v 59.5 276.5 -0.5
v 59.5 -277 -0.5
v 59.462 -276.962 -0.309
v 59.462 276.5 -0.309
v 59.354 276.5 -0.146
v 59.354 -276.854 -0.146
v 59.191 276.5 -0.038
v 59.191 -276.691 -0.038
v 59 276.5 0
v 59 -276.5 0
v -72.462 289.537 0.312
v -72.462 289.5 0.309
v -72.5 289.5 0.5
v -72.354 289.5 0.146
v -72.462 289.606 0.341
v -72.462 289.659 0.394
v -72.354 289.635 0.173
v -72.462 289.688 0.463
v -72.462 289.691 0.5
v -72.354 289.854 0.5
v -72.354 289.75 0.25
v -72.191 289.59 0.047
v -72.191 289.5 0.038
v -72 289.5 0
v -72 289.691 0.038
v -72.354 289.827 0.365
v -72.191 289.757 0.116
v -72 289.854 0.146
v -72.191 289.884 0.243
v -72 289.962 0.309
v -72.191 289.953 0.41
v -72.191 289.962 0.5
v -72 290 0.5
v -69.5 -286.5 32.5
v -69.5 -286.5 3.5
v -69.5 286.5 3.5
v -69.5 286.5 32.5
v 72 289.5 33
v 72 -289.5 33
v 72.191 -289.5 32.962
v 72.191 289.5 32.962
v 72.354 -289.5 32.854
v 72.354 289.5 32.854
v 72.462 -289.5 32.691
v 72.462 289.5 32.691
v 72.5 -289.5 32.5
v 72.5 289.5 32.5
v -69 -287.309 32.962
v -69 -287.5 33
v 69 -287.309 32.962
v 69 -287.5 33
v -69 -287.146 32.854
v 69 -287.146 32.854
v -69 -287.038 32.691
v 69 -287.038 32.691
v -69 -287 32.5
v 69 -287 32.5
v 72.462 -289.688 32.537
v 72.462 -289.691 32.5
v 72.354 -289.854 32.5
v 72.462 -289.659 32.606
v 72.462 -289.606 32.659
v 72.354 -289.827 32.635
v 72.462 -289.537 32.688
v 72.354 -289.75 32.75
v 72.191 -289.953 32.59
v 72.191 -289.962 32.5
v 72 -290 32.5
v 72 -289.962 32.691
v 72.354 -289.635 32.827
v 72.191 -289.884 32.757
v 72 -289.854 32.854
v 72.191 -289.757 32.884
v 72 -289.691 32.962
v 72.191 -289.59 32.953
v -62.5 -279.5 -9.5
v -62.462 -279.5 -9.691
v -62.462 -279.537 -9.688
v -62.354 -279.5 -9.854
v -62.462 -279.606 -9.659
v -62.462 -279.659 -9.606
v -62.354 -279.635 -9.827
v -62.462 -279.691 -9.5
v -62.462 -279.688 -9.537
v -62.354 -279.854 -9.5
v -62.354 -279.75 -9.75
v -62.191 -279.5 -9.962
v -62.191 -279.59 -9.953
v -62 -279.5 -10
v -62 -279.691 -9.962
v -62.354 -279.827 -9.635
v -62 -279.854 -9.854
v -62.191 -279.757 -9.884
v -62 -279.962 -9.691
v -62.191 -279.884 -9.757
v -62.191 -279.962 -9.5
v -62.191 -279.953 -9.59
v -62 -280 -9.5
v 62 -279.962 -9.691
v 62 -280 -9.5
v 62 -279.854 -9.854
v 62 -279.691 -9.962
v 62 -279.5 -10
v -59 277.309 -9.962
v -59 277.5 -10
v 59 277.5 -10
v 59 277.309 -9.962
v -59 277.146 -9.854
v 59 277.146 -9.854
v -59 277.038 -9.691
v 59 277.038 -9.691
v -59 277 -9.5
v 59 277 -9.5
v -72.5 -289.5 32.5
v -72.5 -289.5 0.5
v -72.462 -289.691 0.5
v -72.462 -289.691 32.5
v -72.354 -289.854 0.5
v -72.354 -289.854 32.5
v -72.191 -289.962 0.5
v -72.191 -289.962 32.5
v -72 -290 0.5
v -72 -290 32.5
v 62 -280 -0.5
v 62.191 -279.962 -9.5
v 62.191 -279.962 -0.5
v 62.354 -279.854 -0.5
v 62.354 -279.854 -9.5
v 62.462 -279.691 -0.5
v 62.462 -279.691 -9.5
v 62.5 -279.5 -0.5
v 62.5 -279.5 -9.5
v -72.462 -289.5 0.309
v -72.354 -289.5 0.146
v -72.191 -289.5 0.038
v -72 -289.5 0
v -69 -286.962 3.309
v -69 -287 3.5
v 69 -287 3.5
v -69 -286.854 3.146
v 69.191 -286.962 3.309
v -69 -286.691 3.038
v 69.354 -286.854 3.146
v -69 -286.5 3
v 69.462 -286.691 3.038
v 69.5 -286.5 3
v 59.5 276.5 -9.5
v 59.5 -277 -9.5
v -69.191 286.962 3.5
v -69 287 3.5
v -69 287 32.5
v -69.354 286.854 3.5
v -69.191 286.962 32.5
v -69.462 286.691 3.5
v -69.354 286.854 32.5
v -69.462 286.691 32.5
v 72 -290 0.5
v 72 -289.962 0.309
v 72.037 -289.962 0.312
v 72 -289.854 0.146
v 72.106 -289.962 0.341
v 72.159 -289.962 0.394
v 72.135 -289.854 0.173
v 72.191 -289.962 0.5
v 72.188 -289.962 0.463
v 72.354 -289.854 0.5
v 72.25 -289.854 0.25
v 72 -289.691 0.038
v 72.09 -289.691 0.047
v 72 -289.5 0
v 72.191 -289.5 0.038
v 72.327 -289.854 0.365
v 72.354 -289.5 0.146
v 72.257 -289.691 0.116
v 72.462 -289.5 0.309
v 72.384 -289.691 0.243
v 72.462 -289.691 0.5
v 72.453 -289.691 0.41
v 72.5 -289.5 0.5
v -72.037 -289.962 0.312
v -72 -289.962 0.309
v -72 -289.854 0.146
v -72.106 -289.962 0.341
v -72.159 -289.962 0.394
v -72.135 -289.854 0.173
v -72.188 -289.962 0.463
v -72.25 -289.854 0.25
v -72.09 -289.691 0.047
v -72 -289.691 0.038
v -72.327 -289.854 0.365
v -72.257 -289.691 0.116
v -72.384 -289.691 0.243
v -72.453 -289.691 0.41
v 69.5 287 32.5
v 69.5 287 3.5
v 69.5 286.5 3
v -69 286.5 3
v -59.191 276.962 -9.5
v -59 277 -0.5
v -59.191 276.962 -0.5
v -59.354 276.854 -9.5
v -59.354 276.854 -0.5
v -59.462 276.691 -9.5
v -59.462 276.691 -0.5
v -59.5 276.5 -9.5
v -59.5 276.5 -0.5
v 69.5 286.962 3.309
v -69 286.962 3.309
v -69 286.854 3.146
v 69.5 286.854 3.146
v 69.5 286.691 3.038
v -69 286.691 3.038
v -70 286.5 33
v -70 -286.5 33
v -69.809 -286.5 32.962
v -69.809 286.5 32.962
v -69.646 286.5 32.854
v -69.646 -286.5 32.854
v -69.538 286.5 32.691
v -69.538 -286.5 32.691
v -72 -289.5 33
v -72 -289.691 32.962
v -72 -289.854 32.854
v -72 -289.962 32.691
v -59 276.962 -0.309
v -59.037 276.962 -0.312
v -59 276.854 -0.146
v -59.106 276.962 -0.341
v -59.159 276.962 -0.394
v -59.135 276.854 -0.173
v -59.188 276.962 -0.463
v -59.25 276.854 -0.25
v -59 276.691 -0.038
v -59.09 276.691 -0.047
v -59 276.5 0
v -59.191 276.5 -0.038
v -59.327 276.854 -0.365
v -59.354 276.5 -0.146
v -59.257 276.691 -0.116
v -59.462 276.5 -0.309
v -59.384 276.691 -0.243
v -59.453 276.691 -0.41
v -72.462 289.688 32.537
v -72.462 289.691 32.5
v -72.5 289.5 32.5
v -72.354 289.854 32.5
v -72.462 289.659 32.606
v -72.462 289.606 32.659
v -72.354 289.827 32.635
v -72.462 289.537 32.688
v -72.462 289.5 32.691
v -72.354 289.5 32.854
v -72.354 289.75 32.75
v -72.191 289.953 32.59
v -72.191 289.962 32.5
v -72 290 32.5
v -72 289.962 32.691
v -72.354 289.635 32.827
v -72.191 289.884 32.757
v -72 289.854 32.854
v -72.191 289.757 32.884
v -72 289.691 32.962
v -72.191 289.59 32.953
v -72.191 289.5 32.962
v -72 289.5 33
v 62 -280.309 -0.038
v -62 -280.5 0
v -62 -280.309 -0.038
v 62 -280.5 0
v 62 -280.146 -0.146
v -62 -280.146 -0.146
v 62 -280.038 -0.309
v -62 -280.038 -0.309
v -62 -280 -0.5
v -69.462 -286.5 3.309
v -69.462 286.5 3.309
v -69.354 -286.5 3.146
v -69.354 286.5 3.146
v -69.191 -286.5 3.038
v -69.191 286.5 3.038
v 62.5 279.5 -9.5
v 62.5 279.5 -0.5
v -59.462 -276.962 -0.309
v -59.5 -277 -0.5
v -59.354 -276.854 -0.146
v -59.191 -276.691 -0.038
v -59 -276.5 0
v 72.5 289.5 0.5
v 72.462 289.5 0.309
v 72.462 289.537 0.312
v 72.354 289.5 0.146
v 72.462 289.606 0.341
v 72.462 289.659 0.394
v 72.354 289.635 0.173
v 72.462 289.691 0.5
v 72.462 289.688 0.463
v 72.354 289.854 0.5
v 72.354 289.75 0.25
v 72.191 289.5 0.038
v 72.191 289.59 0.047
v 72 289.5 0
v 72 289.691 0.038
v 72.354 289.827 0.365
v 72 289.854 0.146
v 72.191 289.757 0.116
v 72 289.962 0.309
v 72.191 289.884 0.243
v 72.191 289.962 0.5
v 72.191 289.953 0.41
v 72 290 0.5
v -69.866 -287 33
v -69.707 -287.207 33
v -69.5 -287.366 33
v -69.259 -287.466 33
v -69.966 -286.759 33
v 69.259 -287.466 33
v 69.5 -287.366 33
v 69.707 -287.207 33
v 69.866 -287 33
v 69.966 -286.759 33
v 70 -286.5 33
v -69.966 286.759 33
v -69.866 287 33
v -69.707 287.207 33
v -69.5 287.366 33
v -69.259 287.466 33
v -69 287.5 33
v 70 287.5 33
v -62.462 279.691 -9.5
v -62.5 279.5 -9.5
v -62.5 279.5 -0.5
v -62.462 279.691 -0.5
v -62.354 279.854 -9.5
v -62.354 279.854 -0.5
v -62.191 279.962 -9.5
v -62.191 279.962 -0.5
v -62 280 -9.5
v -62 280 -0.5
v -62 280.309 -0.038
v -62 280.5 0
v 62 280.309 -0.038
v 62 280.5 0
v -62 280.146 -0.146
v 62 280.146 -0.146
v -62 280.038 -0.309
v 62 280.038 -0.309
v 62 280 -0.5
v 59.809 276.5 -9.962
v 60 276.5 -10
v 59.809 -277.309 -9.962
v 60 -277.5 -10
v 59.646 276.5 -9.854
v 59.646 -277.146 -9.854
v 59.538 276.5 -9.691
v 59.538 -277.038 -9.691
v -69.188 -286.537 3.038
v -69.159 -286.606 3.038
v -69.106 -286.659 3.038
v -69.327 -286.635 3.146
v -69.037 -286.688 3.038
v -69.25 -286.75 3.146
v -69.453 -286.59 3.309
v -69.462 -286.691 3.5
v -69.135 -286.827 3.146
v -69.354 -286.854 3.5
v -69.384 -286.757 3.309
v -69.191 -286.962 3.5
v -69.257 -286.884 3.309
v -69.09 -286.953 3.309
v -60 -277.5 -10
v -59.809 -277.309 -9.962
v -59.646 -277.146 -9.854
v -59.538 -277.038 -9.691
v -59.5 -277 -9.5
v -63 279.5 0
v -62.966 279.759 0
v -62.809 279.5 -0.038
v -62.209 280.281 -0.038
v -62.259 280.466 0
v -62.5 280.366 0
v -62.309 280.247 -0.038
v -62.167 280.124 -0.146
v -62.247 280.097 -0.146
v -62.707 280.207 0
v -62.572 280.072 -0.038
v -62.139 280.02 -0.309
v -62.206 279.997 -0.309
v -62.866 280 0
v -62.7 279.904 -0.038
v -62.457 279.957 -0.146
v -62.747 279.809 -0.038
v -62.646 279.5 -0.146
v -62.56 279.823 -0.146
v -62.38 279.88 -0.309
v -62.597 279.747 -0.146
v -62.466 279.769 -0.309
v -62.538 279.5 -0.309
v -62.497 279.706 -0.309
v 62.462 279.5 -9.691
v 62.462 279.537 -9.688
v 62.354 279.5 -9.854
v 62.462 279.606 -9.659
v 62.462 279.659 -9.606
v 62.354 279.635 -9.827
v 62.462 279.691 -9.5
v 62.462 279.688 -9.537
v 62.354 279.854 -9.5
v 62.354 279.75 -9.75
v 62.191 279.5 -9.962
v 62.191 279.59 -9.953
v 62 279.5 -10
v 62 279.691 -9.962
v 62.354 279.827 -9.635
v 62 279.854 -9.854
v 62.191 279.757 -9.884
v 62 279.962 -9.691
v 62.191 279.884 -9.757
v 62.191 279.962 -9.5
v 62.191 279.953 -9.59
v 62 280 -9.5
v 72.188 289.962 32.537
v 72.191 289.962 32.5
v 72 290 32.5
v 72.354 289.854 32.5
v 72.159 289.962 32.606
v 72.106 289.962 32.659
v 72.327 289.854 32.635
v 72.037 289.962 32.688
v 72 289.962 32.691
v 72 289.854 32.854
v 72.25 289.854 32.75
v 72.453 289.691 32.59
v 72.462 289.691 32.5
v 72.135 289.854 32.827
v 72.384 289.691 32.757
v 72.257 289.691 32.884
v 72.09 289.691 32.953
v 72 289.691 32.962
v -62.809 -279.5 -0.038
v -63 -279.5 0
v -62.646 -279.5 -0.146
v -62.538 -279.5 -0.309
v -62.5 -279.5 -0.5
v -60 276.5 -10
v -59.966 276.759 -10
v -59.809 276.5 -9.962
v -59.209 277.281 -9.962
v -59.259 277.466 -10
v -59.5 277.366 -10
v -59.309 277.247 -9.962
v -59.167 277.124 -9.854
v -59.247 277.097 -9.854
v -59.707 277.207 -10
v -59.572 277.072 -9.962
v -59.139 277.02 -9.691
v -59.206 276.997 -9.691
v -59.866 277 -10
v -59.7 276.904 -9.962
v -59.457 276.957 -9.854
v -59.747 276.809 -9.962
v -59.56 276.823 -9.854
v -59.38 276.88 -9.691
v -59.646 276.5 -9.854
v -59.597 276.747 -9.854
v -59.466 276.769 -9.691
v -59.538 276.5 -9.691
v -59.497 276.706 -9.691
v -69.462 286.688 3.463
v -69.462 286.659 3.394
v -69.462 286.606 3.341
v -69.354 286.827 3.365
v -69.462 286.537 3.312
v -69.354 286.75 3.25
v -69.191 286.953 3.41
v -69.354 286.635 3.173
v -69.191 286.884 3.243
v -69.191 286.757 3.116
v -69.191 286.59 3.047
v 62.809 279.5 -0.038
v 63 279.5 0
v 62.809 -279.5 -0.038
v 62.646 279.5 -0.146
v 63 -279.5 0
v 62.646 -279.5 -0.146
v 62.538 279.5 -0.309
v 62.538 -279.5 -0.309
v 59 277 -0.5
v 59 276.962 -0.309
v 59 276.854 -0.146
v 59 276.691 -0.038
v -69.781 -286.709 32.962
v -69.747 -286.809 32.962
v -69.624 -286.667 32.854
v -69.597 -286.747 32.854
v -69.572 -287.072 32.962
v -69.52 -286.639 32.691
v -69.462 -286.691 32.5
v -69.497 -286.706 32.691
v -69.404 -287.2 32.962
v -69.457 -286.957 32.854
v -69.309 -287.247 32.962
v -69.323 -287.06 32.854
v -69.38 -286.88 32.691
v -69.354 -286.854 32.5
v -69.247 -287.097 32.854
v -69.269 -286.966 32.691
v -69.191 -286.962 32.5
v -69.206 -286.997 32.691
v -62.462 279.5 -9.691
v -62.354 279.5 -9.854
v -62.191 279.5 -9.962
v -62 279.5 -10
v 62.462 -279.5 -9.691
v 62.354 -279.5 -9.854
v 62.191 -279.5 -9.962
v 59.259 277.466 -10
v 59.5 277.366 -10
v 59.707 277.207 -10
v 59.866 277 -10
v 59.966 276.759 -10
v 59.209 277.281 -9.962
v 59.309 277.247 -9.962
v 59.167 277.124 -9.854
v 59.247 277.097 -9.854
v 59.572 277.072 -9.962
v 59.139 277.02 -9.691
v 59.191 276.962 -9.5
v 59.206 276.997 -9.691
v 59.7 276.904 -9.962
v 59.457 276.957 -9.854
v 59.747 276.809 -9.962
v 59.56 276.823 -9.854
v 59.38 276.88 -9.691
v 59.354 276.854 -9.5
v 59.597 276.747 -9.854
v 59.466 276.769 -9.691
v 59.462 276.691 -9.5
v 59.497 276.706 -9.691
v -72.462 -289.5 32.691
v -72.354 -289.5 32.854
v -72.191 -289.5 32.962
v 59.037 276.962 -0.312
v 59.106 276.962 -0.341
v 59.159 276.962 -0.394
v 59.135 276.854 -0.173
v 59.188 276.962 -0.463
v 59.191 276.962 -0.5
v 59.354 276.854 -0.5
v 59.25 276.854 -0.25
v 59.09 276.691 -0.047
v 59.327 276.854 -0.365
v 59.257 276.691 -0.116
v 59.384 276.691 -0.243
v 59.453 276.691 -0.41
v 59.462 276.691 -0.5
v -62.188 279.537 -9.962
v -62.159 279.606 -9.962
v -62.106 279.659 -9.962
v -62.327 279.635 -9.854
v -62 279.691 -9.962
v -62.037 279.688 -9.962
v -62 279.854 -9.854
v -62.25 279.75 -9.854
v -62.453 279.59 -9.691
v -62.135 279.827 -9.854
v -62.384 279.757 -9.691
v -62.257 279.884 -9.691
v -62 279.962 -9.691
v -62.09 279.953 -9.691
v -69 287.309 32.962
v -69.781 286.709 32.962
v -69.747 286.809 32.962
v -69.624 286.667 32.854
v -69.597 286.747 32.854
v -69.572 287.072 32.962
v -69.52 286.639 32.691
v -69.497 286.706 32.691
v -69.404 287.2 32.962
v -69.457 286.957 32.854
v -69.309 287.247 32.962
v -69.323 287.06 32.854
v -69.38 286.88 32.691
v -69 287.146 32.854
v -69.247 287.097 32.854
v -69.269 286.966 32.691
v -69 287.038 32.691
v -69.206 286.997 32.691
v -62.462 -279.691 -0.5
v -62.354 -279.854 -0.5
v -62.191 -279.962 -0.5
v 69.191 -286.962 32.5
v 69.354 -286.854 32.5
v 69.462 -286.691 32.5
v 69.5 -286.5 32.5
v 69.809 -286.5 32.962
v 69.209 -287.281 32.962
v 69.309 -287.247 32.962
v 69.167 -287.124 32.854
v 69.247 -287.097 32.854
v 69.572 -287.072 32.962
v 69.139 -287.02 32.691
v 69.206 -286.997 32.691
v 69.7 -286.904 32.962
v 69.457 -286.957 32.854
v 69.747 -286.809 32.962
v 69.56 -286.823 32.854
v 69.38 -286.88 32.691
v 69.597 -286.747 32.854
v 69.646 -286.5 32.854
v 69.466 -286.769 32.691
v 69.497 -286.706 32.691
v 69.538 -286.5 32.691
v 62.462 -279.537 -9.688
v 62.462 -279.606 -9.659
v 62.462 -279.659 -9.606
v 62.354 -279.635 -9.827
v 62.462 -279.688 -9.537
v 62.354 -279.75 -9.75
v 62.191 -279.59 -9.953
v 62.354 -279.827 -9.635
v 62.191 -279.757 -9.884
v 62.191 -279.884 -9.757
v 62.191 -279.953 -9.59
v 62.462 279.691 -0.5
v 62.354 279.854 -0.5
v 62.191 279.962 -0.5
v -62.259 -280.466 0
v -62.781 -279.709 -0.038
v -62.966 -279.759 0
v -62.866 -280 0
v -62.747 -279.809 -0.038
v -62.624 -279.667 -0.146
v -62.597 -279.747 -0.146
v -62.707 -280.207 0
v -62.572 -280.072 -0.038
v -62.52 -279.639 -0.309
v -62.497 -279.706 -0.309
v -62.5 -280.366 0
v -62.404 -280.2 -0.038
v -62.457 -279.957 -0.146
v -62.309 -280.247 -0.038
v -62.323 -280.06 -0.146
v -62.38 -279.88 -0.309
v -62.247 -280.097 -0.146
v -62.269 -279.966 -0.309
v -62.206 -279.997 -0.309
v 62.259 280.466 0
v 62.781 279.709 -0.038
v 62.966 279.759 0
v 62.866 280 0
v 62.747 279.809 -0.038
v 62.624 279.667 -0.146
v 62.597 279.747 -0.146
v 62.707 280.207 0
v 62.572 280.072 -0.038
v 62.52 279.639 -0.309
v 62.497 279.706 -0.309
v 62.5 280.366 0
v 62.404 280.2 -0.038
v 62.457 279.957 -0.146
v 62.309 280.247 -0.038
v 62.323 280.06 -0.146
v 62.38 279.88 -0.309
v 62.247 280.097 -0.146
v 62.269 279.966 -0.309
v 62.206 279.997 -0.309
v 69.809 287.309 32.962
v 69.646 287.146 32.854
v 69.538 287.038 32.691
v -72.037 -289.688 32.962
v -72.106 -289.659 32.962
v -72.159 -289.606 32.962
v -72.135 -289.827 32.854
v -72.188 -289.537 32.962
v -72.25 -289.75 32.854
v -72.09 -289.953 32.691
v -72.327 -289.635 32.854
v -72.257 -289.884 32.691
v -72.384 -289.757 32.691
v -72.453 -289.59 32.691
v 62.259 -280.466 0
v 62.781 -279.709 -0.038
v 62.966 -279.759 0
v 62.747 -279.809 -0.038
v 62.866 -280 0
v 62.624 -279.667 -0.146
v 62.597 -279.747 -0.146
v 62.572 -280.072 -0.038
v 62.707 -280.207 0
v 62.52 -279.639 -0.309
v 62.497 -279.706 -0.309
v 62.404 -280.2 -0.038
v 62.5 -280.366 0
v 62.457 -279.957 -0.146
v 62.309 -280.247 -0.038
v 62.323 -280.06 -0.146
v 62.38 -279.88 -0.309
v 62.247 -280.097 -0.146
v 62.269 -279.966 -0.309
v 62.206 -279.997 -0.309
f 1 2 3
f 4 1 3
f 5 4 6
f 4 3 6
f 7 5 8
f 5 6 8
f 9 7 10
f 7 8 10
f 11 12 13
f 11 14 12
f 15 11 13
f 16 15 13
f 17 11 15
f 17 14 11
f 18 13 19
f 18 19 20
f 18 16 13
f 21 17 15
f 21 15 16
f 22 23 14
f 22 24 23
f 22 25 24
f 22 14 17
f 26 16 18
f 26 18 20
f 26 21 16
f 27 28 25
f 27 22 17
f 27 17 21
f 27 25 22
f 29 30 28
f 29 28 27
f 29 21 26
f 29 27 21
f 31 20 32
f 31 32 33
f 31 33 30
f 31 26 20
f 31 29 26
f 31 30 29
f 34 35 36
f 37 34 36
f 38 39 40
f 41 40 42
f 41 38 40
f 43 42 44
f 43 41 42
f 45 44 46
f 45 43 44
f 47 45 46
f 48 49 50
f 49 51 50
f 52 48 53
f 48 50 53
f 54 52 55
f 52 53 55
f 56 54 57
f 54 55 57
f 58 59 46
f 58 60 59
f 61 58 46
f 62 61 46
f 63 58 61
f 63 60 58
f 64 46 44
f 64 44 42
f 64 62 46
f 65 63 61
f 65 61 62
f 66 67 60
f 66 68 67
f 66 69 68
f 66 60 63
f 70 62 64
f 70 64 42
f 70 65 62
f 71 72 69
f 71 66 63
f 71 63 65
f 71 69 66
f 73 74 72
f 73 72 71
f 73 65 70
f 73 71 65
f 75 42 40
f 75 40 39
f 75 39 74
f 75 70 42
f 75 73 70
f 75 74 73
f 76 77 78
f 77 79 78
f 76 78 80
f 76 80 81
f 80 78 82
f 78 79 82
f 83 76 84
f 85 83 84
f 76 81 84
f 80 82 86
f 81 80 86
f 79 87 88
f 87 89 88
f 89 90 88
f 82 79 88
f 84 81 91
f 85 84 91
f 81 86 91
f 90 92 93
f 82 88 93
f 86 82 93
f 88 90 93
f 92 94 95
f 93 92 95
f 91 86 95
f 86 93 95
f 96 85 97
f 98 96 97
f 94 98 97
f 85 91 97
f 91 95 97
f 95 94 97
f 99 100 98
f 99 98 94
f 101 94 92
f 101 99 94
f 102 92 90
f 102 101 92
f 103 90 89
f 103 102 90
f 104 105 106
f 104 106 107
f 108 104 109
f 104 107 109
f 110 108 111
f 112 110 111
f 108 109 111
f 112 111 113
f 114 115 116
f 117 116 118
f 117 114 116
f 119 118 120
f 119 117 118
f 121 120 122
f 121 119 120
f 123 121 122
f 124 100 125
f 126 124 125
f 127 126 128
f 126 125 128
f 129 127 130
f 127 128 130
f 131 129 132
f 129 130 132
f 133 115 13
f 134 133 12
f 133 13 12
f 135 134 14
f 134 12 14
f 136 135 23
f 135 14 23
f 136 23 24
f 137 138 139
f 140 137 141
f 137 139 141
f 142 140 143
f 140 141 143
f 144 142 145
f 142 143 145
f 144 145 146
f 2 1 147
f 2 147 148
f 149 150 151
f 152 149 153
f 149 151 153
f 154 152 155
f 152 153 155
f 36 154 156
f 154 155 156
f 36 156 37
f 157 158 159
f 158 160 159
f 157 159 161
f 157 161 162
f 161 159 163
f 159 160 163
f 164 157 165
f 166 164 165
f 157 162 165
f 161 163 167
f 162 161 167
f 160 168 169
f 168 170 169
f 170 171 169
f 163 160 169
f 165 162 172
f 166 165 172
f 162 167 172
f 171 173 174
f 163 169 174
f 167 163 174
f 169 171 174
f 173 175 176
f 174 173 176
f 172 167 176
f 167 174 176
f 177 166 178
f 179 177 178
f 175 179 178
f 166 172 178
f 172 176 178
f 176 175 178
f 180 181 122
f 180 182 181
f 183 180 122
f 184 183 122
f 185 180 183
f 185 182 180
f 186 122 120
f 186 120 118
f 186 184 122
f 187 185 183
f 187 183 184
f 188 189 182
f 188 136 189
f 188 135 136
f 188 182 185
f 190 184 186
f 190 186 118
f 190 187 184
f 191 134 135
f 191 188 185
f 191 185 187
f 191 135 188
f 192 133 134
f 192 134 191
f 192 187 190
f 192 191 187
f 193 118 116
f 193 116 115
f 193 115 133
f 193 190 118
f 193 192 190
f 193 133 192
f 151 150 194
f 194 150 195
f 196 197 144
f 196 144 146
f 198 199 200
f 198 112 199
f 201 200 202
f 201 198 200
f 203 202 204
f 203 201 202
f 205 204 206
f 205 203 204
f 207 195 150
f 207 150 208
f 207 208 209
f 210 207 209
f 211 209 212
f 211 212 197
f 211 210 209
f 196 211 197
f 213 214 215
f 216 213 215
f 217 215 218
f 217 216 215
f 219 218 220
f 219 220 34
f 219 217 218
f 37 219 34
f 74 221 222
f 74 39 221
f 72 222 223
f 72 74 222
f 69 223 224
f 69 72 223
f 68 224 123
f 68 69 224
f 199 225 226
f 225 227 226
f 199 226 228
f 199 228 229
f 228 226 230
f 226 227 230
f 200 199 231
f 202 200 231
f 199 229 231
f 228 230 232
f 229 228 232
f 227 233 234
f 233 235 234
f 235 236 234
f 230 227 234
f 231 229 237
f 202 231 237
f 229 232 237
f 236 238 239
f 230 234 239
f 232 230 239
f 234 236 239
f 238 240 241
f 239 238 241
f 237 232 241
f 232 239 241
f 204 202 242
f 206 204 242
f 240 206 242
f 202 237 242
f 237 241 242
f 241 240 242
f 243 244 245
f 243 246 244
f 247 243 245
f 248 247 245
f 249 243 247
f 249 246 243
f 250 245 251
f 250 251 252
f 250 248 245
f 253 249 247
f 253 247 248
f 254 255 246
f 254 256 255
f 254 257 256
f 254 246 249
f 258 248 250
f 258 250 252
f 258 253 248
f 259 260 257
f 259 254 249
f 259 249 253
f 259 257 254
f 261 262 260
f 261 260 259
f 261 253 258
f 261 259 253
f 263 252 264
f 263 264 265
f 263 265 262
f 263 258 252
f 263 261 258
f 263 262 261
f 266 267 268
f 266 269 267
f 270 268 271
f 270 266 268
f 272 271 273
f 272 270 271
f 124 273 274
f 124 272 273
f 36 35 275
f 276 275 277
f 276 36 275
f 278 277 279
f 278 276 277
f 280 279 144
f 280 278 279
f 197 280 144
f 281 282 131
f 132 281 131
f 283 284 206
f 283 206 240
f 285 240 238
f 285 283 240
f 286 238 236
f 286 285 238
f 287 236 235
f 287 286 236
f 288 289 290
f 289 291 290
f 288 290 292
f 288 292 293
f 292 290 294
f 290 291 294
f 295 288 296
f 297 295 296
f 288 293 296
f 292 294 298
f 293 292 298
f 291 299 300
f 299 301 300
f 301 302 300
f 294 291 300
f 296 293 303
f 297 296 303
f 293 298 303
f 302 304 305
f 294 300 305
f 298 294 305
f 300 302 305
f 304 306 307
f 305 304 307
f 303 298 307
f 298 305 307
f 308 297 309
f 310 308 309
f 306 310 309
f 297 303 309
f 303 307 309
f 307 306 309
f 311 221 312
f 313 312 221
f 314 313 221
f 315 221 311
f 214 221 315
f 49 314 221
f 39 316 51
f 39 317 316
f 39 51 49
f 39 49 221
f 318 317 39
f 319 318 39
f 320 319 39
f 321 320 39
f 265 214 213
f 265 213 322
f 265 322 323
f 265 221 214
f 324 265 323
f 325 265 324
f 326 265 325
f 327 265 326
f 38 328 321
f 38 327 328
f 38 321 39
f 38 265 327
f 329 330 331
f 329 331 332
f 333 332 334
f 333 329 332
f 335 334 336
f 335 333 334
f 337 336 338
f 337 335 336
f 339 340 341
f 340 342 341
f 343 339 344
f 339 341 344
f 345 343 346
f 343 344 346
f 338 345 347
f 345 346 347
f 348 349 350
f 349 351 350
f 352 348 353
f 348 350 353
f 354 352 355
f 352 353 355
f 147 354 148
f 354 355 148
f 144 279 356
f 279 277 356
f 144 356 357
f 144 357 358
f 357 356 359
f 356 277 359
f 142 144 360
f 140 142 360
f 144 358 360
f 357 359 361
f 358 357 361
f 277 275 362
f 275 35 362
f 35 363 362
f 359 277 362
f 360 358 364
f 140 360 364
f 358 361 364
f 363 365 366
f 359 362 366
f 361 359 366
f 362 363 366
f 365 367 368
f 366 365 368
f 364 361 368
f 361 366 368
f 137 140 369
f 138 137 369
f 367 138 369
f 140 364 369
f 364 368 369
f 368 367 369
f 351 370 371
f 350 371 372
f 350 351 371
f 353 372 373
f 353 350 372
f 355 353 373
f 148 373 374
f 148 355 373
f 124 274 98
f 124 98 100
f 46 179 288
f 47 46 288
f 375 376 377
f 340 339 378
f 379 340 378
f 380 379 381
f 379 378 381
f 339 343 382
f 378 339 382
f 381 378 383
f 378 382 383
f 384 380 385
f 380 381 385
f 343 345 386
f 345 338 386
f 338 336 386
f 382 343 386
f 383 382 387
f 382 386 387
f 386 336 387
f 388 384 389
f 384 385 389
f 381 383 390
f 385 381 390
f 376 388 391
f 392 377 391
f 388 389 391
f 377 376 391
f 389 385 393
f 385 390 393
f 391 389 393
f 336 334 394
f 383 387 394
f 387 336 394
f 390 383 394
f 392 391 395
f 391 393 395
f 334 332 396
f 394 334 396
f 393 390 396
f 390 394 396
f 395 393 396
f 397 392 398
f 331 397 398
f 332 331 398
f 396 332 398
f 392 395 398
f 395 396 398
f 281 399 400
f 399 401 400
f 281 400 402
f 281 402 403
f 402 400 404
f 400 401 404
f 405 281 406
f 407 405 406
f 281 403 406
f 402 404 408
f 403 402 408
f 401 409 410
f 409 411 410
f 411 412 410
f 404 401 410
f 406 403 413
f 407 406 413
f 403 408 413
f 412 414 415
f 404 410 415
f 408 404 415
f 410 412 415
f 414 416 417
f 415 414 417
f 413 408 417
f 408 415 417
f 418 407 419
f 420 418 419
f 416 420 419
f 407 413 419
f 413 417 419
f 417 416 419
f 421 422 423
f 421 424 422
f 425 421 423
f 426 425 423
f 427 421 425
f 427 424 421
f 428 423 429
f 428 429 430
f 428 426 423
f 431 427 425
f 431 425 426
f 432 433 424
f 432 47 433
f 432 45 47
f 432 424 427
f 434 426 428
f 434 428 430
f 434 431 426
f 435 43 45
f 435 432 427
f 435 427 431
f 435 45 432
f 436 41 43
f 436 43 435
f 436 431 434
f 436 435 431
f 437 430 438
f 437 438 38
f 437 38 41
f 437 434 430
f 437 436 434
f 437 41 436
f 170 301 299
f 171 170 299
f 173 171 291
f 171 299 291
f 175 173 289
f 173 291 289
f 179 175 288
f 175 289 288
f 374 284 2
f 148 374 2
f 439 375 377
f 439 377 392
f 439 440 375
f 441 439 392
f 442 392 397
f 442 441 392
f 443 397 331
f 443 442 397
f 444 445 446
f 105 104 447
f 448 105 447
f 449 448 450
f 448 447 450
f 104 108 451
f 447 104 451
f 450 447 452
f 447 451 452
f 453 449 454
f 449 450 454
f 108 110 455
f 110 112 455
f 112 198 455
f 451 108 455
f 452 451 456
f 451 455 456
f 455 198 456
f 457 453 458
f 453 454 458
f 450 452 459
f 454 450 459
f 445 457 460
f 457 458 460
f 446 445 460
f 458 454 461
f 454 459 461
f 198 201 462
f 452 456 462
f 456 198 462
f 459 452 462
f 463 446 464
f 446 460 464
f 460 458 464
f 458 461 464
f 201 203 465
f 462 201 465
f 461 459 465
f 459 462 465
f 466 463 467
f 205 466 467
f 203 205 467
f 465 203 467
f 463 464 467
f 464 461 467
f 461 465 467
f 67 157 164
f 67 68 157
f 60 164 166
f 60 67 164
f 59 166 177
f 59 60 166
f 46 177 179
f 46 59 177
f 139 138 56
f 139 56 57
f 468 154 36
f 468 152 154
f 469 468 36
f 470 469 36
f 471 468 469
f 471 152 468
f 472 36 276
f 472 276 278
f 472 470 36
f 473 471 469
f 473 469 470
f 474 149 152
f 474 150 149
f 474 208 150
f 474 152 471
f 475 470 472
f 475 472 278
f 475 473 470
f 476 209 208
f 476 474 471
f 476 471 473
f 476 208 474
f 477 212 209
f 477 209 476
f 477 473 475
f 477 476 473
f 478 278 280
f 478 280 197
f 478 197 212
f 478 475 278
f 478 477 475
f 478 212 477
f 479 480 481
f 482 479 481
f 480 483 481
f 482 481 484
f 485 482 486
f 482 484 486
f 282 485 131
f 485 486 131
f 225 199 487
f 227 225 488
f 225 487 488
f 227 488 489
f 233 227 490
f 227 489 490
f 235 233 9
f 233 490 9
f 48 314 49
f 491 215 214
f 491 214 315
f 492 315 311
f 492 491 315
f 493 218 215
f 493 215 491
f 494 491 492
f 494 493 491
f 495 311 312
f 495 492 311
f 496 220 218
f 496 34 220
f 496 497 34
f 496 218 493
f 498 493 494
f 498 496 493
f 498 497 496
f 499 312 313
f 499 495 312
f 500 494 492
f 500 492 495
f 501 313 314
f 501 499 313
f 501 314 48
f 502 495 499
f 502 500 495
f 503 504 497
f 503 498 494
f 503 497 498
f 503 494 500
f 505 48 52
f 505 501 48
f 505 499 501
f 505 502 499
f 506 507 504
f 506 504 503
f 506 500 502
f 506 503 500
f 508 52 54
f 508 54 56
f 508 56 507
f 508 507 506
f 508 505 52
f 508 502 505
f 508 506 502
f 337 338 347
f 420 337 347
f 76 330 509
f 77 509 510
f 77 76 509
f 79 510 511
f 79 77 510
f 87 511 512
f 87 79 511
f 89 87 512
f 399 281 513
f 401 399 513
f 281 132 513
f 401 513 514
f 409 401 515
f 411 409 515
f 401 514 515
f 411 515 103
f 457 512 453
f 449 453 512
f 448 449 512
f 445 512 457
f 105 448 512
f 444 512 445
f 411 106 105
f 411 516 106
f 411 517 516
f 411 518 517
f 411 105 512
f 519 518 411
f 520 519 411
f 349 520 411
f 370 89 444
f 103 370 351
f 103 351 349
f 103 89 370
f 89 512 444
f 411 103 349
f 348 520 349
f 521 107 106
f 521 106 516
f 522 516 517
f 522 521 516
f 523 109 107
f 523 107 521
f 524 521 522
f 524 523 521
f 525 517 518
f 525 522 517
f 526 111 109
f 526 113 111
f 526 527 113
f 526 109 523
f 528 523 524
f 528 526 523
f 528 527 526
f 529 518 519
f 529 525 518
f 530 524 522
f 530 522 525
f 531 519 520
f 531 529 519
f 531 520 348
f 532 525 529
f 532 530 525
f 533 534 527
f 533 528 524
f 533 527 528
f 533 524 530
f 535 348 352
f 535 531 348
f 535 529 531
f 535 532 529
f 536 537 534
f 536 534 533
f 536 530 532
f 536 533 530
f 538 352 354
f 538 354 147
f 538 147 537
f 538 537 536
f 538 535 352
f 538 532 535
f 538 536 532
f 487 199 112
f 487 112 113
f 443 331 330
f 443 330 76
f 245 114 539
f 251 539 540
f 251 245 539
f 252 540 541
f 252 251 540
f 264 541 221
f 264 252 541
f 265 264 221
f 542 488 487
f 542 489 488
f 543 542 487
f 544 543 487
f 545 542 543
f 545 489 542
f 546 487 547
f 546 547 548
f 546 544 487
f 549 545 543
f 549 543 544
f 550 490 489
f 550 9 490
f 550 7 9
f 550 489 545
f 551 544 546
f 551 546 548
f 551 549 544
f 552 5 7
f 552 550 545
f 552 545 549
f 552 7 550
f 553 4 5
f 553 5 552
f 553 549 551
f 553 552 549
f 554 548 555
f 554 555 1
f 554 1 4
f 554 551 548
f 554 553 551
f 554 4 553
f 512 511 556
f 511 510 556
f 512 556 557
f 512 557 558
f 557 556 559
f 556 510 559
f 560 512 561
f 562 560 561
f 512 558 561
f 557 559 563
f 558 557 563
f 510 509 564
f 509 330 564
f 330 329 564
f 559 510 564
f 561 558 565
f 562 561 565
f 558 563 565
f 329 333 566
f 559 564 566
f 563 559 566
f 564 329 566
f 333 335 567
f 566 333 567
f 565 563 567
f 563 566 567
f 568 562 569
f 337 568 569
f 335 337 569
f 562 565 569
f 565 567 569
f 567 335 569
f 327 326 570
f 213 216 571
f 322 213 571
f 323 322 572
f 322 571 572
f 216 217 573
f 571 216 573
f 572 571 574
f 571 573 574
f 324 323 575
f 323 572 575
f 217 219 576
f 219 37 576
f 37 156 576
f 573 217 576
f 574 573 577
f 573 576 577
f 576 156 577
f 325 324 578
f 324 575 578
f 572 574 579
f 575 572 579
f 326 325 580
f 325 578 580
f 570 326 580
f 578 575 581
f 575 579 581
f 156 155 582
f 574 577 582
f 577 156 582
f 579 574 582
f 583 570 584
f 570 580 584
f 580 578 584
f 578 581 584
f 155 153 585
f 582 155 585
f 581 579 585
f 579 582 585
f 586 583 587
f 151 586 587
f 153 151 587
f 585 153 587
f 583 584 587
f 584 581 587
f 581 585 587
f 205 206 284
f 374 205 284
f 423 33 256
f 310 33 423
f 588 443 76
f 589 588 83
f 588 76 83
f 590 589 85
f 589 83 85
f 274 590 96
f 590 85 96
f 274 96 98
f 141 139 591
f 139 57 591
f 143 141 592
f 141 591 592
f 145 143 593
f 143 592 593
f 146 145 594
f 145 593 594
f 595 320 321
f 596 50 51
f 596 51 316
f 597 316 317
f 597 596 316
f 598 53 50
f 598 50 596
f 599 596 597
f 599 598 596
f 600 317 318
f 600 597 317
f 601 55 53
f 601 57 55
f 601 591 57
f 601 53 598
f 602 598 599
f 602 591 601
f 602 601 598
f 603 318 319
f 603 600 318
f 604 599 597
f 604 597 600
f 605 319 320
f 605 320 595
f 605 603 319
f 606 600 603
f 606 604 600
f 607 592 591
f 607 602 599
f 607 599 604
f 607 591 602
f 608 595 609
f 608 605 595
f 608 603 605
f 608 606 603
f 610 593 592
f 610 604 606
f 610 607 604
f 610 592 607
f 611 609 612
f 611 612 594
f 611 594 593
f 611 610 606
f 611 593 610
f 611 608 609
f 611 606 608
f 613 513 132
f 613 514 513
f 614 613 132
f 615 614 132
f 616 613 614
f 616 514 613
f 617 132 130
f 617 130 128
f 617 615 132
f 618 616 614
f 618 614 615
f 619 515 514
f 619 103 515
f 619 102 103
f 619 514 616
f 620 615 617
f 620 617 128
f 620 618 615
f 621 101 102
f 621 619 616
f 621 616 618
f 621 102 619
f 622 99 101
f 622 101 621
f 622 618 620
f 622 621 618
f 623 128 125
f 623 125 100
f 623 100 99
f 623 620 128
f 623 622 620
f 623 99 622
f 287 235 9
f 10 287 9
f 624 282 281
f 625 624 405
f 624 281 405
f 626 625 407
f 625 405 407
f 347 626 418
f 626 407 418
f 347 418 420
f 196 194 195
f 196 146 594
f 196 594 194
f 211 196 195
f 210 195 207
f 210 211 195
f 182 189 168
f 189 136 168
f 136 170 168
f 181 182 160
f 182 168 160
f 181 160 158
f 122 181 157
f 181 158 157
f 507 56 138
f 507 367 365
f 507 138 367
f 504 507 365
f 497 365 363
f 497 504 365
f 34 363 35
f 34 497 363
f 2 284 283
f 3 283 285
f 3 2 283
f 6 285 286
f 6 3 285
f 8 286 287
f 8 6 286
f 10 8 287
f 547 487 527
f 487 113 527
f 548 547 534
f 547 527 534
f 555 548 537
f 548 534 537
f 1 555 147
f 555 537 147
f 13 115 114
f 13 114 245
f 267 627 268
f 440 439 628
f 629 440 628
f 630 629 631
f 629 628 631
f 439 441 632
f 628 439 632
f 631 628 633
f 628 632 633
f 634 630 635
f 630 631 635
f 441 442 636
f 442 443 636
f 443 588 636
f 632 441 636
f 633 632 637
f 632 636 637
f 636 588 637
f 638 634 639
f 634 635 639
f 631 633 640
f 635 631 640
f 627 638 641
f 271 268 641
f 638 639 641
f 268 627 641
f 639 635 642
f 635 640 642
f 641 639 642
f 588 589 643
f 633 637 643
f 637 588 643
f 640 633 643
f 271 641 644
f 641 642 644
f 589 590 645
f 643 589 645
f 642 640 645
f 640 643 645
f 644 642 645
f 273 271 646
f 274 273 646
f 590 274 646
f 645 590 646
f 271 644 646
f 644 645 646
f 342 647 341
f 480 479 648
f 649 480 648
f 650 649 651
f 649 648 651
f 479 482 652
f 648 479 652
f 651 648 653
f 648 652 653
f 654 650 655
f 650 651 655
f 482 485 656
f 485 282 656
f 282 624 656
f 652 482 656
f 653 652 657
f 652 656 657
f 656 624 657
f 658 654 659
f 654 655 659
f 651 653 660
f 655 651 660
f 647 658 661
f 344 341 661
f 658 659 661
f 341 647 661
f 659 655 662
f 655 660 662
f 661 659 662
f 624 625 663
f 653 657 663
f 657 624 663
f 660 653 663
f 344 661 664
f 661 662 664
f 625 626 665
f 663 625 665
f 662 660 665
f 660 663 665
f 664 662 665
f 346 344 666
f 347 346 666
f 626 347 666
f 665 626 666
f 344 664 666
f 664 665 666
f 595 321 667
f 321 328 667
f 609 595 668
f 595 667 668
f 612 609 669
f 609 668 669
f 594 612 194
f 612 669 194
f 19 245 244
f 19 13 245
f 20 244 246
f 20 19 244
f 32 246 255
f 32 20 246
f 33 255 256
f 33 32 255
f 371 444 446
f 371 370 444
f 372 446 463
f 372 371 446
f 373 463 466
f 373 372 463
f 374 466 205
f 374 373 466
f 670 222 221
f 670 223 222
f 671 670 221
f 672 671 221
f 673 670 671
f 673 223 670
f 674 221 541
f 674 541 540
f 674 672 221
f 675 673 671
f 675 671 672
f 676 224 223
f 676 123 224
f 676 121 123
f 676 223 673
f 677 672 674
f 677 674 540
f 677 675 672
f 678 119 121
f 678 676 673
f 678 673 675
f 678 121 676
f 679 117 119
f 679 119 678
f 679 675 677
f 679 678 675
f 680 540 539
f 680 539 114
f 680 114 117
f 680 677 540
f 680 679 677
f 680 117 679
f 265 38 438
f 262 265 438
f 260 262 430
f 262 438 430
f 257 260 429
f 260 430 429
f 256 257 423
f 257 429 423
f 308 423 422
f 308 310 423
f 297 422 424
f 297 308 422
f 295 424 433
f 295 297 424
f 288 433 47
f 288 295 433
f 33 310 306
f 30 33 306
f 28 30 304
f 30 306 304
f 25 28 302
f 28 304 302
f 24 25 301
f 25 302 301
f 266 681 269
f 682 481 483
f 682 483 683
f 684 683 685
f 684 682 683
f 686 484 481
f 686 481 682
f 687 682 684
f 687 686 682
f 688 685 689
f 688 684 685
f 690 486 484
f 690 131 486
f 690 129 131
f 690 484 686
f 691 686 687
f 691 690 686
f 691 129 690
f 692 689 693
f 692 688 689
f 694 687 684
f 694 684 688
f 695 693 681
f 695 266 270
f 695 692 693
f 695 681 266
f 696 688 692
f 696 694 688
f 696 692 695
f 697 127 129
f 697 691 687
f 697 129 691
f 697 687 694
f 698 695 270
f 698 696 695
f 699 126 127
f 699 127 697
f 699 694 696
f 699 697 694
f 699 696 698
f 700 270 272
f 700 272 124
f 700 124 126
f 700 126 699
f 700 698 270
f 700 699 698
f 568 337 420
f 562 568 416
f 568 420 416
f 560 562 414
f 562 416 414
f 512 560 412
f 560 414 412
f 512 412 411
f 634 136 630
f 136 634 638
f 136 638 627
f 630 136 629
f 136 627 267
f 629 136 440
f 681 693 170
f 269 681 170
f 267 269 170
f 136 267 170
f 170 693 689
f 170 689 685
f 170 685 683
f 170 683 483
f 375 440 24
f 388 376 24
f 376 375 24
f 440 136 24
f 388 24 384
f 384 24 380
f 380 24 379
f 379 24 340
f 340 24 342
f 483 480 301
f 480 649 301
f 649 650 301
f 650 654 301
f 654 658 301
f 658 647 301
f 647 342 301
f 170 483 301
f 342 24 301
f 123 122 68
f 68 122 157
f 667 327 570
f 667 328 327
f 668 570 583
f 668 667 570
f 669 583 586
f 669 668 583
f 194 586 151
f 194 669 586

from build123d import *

# Parameters (mm, degrees)
F0_W     = 145
F0_H     = 580
F1_DEPTH = 3
F2_W     = 145
F2_H     = 580
F2_W_2   = 138.9999985695
F2_H_2   = 573.9999985695
F3_DEPTH = 30
F4_W     = 125
F4_H     = 560
F4_W_2   = 119.0000200272
F4_H_2   = 554.0000200272
F5_DEPTH = 10
F6_R     = 0.5


with BuildPart() as f1:
    # F0 (on Top) → F1 (new body)
    with BuildSketch(Plane.XY):
        Rectangle(F0_W, F0_H)
    extrude(amount=F1_DEPTH)

    # F2 (on face) → F3 (join)
    with BuildSketch(Plane.XY.offset(3)):
        Rectangle(F2_W, F2_H)
        Rectangle(F2_W_2, F2_H_2, mode=Mode.SUBTRACT)
    extrude(amount=F3_DEPTH)

    # F4 (on face) → F5 (join)
    with BuildSketch(Plane(origin=(0, 0, 0), x_dir=(1, 0, 0), z_dir=(0, 0, -1))):
        Rectangle(F4_W, F4_H)
        Rectangle(F4_W_2, F4_H_2, mode=Mode.SUBTRACT)
    extrude(amount=F5_DEPTH)

    # F6
    f6_edges = [f1.edges().sort_by_distance(p)[0] for p in [
        (0, 290, 0),
        (72.5, 0, 0),
        (-72.5, 0, 0),
        (0, -290, 0),
        (62.5, 0, 0),
        (0, 280, 0),
        (-62.5, 0, 0),
        (0, -280, 0),
        (59.50001, 0, 0),
        (0, -277.00001, 0),
        (-59.50001, 0, 0),
        (0, 277.00001, 0),
        (-62.5, 280, -5),
        (0, -280, -10),
        (-62.5, 0, -10),
        (0, 280, -10),
        (62.5, 0, -10),
        (0, 277.00001, -10),
        (-59.50001, 0, -10),
        (0, -277.00001, -10),
        (59.50001, 0, -10),
        (59.50001, 277.00001, -5),
        (-59.50001, 277.00001, -5),
        (62.5, -280, -5),
        (-62.5, -280, -5),
        (62.5, 280, -5),
        (-72.5, -290, 16.5),
        (0, -290, 33),
        (72.5, -290, 16.5),
        (72.5, 0, 33),
        (72.5, 290, 16.5),
        (0, 290, 33),
        (-72.5, 290, 16.5),
        (69.499999, 0, 33),
        (0, 286.999999, 3),
        (-69.499999, -286.999999, 18),
        (-69.499999, 286.999999, 18),
        (-69.499999, 0, 3),
        (-69.499999, 0, 33),
        (69.499999, -286.999999, 18),
        (0, -286.999999, 3),
        (0, -286.999999, 33),
        (-72.5, 0, 33),
        (0, 286.999999, 33),
    ]]
    fillet(f6_edges, radius=F6_R)


solid = f1.part
